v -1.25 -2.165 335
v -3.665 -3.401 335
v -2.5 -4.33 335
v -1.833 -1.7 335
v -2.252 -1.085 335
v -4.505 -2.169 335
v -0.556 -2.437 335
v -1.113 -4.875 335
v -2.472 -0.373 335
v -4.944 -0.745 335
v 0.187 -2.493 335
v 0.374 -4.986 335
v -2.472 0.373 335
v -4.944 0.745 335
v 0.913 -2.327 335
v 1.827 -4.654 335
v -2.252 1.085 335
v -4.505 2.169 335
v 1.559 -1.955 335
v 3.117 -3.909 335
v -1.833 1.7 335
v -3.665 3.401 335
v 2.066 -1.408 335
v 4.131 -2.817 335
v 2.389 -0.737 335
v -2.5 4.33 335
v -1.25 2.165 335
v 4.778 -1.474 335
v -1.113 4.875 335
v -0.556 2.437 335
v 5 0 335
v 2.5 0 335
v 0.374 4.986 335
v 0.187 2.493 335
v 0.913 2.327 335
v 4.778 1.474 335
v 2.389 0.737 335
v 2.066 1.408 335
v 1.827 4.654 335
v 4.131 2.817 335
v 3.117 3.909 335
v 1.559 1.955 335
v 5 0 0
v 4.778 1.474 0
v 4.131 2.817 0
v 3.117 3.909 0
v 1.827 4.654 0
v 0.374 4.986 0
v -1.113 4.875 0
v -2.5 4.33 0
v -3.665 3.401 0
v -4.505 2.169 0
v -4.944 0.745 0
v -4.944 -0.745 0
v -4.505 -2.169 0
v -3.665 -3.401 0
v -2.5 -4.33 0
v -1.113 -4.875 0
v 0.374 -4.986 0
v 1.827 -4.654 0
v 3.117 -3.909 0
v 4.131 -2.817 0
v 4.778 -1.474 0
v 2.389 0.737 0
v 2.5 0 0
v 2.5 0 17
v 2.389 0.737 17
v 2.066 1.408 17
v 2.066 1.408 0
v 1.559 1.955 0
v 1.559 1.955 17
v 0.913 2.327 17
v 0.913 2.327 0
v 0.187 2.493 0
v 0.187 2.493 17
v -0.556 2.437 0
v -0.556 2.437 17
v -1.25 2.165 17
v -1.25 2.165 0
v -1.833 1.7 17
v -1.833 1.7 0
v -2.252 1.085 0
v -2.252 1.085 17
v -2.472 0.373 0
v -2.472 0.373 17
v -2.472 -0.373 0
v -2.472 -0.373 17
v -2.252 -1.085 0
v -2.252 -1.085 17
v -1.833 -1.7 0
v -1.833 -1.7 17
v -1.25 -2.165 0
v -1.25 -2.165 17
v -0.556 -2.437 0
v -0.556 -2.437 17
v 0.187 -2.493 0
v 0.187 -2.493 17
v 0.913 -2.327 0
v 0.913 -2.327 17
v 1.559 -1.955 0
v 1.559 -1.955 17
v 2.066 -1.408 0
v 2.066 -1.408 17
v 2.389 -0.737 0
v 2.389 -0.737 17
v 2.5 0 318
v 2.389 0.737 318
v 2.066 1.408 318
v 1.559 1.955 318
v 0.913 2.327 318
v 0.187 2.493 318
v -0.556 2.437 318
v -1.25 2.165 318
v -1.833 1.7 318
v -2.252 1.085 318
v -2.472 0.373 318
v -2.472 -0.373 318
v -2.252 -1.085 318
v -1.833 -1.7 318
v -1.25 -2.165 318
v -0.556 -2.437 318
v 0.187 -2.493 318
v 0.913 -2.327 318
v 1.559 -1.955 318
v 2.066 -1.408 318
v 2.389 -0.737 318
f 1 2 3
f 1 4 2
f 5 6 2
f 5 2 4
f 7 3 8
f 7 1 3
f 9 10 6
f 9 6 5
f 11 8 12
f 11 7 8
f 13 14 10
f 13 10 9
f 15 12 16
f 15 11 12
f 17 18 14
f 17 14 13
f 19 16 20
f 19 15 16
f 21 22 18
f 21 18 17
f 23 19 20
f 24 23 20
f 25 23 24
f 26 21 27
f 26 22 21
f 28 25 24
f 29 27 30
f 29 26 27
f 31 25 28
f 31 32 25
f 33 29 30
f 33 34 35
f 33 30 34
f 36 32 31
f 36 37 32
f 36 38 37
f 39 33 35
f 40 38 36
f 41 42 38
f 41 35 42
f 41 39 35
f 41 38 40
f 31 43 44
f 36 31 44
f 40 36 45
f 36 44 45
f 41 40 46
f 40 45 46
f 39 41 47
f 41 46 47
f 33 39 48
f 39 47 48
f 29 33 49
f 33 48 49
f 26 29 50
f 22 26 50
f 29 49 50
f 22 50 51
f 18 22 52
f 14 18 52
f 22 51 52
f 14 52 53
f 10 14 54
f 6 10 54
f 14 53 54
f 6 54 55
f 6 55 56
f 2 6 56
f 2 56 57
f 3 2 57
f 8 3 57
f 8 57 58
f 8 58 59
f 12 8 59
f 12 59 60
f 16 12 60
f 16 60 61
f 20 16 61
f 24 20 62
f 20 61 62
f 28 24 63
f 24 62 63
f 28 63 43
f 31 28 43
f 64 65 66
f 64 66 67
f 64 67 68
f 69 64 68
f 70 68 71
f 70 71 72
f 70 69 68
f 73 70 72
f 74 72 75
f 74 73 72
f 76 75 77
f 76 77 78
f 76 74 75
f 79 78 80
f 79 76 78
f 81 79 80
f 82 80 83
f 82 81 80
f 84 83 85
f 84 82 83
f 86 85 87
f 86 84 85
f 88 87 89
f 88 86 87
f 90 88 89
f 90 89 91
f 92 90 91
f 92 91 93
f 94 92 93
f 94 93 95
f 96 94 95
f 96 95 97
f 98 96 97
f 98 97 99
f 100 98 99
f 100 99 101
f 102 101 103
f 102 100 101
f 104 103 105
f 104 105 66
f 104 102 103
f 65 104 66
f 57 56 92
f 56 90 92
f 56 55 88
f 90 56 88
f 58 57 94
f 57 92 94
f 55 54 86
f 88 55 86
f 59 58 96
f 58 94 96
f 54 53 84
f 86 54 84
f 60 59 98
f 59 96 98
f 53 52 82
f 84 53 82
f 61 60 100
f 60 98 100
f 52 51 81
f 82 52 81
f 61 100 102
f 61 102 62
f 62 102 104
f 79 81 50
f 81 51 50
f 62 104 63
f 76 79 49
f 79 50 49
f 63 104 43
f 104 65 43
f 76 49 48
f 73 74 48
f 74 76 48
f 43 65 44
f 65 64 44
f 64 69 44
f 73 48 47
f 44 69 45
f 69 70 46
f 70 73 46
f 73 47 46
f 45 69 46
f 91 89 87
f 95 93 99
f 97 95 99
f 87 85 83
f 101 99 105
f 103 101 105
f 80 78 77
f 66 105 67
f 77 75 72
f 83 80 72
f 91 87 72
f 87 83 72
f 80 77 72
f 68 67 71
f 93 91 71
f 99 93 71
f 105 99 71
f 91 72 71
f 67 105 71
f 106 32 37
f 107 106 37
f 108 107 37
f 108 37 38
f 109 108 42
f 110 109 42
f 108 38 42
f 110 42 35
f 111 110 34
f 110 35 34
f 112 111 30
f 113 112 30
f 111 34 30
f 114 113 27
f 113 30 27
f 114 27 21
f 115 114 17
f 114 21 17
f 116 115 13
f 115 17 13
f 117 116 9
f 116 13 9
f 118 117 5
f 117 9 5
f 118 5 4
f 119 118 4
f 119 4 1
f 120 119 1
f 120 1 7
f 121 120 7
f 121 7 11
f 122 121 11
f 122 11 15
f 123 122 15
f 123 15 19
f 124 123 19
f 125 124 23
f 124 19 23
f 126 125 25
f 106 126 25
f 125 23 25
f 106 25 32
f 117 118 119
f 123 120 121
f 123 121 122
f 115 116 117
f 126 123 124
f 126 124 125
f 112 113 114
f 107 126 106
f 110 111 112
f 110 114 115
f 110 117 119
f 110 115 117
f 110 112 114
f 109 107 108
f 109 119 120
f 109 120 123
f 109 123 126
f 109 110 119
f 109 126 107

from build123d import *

# Parameters (mm, degrees)
SKIZZE1_R                       = 5
AUFSATZ_LINEAR_AUSTRAGEN1_DEPTH = 335
SKIZZE2_R                       = 2.5
SCHNITT_LINEAR_AUSTRAGEN3_DEPTH = 17
SKIZZE3_R                       = 2.5
SCHNITT_LINEAR_AUSTRAGEN4_DEPTH = 17


with BuildPart() as part:
    # Skizze1 → Aufsatz-Linear austragen1 (new body)
    with BuildSketch(Plane.XY):
        Circle(SKIZZE1_R)
    extrude(amount=AUFSATZ_LINEAR_AUSTRAGEN1_DEPTH)

    # Skizze2 → Schnitt-Linear austragen3 (cut)
    with BuildSketch(Plane.XY):
        Circle(SKIZZE2_R)
    extrude(amount=SCHNITT_LINEAR_AUSTRAGEN3_DEPTH, mode=Mode.SUBTRACT)

    # Skizze3 → Schnitt-Linear austragen4 (cut)
    with BuildSketch(Plane.XY.offset(335)):
        Circle(SKIZZE3_R)
    extrude(amount=-SCHNITT_LINEAR_AUSTRAGEN4_DEPTH, mode=Mode.SUBTRACT)


solid = part.part
